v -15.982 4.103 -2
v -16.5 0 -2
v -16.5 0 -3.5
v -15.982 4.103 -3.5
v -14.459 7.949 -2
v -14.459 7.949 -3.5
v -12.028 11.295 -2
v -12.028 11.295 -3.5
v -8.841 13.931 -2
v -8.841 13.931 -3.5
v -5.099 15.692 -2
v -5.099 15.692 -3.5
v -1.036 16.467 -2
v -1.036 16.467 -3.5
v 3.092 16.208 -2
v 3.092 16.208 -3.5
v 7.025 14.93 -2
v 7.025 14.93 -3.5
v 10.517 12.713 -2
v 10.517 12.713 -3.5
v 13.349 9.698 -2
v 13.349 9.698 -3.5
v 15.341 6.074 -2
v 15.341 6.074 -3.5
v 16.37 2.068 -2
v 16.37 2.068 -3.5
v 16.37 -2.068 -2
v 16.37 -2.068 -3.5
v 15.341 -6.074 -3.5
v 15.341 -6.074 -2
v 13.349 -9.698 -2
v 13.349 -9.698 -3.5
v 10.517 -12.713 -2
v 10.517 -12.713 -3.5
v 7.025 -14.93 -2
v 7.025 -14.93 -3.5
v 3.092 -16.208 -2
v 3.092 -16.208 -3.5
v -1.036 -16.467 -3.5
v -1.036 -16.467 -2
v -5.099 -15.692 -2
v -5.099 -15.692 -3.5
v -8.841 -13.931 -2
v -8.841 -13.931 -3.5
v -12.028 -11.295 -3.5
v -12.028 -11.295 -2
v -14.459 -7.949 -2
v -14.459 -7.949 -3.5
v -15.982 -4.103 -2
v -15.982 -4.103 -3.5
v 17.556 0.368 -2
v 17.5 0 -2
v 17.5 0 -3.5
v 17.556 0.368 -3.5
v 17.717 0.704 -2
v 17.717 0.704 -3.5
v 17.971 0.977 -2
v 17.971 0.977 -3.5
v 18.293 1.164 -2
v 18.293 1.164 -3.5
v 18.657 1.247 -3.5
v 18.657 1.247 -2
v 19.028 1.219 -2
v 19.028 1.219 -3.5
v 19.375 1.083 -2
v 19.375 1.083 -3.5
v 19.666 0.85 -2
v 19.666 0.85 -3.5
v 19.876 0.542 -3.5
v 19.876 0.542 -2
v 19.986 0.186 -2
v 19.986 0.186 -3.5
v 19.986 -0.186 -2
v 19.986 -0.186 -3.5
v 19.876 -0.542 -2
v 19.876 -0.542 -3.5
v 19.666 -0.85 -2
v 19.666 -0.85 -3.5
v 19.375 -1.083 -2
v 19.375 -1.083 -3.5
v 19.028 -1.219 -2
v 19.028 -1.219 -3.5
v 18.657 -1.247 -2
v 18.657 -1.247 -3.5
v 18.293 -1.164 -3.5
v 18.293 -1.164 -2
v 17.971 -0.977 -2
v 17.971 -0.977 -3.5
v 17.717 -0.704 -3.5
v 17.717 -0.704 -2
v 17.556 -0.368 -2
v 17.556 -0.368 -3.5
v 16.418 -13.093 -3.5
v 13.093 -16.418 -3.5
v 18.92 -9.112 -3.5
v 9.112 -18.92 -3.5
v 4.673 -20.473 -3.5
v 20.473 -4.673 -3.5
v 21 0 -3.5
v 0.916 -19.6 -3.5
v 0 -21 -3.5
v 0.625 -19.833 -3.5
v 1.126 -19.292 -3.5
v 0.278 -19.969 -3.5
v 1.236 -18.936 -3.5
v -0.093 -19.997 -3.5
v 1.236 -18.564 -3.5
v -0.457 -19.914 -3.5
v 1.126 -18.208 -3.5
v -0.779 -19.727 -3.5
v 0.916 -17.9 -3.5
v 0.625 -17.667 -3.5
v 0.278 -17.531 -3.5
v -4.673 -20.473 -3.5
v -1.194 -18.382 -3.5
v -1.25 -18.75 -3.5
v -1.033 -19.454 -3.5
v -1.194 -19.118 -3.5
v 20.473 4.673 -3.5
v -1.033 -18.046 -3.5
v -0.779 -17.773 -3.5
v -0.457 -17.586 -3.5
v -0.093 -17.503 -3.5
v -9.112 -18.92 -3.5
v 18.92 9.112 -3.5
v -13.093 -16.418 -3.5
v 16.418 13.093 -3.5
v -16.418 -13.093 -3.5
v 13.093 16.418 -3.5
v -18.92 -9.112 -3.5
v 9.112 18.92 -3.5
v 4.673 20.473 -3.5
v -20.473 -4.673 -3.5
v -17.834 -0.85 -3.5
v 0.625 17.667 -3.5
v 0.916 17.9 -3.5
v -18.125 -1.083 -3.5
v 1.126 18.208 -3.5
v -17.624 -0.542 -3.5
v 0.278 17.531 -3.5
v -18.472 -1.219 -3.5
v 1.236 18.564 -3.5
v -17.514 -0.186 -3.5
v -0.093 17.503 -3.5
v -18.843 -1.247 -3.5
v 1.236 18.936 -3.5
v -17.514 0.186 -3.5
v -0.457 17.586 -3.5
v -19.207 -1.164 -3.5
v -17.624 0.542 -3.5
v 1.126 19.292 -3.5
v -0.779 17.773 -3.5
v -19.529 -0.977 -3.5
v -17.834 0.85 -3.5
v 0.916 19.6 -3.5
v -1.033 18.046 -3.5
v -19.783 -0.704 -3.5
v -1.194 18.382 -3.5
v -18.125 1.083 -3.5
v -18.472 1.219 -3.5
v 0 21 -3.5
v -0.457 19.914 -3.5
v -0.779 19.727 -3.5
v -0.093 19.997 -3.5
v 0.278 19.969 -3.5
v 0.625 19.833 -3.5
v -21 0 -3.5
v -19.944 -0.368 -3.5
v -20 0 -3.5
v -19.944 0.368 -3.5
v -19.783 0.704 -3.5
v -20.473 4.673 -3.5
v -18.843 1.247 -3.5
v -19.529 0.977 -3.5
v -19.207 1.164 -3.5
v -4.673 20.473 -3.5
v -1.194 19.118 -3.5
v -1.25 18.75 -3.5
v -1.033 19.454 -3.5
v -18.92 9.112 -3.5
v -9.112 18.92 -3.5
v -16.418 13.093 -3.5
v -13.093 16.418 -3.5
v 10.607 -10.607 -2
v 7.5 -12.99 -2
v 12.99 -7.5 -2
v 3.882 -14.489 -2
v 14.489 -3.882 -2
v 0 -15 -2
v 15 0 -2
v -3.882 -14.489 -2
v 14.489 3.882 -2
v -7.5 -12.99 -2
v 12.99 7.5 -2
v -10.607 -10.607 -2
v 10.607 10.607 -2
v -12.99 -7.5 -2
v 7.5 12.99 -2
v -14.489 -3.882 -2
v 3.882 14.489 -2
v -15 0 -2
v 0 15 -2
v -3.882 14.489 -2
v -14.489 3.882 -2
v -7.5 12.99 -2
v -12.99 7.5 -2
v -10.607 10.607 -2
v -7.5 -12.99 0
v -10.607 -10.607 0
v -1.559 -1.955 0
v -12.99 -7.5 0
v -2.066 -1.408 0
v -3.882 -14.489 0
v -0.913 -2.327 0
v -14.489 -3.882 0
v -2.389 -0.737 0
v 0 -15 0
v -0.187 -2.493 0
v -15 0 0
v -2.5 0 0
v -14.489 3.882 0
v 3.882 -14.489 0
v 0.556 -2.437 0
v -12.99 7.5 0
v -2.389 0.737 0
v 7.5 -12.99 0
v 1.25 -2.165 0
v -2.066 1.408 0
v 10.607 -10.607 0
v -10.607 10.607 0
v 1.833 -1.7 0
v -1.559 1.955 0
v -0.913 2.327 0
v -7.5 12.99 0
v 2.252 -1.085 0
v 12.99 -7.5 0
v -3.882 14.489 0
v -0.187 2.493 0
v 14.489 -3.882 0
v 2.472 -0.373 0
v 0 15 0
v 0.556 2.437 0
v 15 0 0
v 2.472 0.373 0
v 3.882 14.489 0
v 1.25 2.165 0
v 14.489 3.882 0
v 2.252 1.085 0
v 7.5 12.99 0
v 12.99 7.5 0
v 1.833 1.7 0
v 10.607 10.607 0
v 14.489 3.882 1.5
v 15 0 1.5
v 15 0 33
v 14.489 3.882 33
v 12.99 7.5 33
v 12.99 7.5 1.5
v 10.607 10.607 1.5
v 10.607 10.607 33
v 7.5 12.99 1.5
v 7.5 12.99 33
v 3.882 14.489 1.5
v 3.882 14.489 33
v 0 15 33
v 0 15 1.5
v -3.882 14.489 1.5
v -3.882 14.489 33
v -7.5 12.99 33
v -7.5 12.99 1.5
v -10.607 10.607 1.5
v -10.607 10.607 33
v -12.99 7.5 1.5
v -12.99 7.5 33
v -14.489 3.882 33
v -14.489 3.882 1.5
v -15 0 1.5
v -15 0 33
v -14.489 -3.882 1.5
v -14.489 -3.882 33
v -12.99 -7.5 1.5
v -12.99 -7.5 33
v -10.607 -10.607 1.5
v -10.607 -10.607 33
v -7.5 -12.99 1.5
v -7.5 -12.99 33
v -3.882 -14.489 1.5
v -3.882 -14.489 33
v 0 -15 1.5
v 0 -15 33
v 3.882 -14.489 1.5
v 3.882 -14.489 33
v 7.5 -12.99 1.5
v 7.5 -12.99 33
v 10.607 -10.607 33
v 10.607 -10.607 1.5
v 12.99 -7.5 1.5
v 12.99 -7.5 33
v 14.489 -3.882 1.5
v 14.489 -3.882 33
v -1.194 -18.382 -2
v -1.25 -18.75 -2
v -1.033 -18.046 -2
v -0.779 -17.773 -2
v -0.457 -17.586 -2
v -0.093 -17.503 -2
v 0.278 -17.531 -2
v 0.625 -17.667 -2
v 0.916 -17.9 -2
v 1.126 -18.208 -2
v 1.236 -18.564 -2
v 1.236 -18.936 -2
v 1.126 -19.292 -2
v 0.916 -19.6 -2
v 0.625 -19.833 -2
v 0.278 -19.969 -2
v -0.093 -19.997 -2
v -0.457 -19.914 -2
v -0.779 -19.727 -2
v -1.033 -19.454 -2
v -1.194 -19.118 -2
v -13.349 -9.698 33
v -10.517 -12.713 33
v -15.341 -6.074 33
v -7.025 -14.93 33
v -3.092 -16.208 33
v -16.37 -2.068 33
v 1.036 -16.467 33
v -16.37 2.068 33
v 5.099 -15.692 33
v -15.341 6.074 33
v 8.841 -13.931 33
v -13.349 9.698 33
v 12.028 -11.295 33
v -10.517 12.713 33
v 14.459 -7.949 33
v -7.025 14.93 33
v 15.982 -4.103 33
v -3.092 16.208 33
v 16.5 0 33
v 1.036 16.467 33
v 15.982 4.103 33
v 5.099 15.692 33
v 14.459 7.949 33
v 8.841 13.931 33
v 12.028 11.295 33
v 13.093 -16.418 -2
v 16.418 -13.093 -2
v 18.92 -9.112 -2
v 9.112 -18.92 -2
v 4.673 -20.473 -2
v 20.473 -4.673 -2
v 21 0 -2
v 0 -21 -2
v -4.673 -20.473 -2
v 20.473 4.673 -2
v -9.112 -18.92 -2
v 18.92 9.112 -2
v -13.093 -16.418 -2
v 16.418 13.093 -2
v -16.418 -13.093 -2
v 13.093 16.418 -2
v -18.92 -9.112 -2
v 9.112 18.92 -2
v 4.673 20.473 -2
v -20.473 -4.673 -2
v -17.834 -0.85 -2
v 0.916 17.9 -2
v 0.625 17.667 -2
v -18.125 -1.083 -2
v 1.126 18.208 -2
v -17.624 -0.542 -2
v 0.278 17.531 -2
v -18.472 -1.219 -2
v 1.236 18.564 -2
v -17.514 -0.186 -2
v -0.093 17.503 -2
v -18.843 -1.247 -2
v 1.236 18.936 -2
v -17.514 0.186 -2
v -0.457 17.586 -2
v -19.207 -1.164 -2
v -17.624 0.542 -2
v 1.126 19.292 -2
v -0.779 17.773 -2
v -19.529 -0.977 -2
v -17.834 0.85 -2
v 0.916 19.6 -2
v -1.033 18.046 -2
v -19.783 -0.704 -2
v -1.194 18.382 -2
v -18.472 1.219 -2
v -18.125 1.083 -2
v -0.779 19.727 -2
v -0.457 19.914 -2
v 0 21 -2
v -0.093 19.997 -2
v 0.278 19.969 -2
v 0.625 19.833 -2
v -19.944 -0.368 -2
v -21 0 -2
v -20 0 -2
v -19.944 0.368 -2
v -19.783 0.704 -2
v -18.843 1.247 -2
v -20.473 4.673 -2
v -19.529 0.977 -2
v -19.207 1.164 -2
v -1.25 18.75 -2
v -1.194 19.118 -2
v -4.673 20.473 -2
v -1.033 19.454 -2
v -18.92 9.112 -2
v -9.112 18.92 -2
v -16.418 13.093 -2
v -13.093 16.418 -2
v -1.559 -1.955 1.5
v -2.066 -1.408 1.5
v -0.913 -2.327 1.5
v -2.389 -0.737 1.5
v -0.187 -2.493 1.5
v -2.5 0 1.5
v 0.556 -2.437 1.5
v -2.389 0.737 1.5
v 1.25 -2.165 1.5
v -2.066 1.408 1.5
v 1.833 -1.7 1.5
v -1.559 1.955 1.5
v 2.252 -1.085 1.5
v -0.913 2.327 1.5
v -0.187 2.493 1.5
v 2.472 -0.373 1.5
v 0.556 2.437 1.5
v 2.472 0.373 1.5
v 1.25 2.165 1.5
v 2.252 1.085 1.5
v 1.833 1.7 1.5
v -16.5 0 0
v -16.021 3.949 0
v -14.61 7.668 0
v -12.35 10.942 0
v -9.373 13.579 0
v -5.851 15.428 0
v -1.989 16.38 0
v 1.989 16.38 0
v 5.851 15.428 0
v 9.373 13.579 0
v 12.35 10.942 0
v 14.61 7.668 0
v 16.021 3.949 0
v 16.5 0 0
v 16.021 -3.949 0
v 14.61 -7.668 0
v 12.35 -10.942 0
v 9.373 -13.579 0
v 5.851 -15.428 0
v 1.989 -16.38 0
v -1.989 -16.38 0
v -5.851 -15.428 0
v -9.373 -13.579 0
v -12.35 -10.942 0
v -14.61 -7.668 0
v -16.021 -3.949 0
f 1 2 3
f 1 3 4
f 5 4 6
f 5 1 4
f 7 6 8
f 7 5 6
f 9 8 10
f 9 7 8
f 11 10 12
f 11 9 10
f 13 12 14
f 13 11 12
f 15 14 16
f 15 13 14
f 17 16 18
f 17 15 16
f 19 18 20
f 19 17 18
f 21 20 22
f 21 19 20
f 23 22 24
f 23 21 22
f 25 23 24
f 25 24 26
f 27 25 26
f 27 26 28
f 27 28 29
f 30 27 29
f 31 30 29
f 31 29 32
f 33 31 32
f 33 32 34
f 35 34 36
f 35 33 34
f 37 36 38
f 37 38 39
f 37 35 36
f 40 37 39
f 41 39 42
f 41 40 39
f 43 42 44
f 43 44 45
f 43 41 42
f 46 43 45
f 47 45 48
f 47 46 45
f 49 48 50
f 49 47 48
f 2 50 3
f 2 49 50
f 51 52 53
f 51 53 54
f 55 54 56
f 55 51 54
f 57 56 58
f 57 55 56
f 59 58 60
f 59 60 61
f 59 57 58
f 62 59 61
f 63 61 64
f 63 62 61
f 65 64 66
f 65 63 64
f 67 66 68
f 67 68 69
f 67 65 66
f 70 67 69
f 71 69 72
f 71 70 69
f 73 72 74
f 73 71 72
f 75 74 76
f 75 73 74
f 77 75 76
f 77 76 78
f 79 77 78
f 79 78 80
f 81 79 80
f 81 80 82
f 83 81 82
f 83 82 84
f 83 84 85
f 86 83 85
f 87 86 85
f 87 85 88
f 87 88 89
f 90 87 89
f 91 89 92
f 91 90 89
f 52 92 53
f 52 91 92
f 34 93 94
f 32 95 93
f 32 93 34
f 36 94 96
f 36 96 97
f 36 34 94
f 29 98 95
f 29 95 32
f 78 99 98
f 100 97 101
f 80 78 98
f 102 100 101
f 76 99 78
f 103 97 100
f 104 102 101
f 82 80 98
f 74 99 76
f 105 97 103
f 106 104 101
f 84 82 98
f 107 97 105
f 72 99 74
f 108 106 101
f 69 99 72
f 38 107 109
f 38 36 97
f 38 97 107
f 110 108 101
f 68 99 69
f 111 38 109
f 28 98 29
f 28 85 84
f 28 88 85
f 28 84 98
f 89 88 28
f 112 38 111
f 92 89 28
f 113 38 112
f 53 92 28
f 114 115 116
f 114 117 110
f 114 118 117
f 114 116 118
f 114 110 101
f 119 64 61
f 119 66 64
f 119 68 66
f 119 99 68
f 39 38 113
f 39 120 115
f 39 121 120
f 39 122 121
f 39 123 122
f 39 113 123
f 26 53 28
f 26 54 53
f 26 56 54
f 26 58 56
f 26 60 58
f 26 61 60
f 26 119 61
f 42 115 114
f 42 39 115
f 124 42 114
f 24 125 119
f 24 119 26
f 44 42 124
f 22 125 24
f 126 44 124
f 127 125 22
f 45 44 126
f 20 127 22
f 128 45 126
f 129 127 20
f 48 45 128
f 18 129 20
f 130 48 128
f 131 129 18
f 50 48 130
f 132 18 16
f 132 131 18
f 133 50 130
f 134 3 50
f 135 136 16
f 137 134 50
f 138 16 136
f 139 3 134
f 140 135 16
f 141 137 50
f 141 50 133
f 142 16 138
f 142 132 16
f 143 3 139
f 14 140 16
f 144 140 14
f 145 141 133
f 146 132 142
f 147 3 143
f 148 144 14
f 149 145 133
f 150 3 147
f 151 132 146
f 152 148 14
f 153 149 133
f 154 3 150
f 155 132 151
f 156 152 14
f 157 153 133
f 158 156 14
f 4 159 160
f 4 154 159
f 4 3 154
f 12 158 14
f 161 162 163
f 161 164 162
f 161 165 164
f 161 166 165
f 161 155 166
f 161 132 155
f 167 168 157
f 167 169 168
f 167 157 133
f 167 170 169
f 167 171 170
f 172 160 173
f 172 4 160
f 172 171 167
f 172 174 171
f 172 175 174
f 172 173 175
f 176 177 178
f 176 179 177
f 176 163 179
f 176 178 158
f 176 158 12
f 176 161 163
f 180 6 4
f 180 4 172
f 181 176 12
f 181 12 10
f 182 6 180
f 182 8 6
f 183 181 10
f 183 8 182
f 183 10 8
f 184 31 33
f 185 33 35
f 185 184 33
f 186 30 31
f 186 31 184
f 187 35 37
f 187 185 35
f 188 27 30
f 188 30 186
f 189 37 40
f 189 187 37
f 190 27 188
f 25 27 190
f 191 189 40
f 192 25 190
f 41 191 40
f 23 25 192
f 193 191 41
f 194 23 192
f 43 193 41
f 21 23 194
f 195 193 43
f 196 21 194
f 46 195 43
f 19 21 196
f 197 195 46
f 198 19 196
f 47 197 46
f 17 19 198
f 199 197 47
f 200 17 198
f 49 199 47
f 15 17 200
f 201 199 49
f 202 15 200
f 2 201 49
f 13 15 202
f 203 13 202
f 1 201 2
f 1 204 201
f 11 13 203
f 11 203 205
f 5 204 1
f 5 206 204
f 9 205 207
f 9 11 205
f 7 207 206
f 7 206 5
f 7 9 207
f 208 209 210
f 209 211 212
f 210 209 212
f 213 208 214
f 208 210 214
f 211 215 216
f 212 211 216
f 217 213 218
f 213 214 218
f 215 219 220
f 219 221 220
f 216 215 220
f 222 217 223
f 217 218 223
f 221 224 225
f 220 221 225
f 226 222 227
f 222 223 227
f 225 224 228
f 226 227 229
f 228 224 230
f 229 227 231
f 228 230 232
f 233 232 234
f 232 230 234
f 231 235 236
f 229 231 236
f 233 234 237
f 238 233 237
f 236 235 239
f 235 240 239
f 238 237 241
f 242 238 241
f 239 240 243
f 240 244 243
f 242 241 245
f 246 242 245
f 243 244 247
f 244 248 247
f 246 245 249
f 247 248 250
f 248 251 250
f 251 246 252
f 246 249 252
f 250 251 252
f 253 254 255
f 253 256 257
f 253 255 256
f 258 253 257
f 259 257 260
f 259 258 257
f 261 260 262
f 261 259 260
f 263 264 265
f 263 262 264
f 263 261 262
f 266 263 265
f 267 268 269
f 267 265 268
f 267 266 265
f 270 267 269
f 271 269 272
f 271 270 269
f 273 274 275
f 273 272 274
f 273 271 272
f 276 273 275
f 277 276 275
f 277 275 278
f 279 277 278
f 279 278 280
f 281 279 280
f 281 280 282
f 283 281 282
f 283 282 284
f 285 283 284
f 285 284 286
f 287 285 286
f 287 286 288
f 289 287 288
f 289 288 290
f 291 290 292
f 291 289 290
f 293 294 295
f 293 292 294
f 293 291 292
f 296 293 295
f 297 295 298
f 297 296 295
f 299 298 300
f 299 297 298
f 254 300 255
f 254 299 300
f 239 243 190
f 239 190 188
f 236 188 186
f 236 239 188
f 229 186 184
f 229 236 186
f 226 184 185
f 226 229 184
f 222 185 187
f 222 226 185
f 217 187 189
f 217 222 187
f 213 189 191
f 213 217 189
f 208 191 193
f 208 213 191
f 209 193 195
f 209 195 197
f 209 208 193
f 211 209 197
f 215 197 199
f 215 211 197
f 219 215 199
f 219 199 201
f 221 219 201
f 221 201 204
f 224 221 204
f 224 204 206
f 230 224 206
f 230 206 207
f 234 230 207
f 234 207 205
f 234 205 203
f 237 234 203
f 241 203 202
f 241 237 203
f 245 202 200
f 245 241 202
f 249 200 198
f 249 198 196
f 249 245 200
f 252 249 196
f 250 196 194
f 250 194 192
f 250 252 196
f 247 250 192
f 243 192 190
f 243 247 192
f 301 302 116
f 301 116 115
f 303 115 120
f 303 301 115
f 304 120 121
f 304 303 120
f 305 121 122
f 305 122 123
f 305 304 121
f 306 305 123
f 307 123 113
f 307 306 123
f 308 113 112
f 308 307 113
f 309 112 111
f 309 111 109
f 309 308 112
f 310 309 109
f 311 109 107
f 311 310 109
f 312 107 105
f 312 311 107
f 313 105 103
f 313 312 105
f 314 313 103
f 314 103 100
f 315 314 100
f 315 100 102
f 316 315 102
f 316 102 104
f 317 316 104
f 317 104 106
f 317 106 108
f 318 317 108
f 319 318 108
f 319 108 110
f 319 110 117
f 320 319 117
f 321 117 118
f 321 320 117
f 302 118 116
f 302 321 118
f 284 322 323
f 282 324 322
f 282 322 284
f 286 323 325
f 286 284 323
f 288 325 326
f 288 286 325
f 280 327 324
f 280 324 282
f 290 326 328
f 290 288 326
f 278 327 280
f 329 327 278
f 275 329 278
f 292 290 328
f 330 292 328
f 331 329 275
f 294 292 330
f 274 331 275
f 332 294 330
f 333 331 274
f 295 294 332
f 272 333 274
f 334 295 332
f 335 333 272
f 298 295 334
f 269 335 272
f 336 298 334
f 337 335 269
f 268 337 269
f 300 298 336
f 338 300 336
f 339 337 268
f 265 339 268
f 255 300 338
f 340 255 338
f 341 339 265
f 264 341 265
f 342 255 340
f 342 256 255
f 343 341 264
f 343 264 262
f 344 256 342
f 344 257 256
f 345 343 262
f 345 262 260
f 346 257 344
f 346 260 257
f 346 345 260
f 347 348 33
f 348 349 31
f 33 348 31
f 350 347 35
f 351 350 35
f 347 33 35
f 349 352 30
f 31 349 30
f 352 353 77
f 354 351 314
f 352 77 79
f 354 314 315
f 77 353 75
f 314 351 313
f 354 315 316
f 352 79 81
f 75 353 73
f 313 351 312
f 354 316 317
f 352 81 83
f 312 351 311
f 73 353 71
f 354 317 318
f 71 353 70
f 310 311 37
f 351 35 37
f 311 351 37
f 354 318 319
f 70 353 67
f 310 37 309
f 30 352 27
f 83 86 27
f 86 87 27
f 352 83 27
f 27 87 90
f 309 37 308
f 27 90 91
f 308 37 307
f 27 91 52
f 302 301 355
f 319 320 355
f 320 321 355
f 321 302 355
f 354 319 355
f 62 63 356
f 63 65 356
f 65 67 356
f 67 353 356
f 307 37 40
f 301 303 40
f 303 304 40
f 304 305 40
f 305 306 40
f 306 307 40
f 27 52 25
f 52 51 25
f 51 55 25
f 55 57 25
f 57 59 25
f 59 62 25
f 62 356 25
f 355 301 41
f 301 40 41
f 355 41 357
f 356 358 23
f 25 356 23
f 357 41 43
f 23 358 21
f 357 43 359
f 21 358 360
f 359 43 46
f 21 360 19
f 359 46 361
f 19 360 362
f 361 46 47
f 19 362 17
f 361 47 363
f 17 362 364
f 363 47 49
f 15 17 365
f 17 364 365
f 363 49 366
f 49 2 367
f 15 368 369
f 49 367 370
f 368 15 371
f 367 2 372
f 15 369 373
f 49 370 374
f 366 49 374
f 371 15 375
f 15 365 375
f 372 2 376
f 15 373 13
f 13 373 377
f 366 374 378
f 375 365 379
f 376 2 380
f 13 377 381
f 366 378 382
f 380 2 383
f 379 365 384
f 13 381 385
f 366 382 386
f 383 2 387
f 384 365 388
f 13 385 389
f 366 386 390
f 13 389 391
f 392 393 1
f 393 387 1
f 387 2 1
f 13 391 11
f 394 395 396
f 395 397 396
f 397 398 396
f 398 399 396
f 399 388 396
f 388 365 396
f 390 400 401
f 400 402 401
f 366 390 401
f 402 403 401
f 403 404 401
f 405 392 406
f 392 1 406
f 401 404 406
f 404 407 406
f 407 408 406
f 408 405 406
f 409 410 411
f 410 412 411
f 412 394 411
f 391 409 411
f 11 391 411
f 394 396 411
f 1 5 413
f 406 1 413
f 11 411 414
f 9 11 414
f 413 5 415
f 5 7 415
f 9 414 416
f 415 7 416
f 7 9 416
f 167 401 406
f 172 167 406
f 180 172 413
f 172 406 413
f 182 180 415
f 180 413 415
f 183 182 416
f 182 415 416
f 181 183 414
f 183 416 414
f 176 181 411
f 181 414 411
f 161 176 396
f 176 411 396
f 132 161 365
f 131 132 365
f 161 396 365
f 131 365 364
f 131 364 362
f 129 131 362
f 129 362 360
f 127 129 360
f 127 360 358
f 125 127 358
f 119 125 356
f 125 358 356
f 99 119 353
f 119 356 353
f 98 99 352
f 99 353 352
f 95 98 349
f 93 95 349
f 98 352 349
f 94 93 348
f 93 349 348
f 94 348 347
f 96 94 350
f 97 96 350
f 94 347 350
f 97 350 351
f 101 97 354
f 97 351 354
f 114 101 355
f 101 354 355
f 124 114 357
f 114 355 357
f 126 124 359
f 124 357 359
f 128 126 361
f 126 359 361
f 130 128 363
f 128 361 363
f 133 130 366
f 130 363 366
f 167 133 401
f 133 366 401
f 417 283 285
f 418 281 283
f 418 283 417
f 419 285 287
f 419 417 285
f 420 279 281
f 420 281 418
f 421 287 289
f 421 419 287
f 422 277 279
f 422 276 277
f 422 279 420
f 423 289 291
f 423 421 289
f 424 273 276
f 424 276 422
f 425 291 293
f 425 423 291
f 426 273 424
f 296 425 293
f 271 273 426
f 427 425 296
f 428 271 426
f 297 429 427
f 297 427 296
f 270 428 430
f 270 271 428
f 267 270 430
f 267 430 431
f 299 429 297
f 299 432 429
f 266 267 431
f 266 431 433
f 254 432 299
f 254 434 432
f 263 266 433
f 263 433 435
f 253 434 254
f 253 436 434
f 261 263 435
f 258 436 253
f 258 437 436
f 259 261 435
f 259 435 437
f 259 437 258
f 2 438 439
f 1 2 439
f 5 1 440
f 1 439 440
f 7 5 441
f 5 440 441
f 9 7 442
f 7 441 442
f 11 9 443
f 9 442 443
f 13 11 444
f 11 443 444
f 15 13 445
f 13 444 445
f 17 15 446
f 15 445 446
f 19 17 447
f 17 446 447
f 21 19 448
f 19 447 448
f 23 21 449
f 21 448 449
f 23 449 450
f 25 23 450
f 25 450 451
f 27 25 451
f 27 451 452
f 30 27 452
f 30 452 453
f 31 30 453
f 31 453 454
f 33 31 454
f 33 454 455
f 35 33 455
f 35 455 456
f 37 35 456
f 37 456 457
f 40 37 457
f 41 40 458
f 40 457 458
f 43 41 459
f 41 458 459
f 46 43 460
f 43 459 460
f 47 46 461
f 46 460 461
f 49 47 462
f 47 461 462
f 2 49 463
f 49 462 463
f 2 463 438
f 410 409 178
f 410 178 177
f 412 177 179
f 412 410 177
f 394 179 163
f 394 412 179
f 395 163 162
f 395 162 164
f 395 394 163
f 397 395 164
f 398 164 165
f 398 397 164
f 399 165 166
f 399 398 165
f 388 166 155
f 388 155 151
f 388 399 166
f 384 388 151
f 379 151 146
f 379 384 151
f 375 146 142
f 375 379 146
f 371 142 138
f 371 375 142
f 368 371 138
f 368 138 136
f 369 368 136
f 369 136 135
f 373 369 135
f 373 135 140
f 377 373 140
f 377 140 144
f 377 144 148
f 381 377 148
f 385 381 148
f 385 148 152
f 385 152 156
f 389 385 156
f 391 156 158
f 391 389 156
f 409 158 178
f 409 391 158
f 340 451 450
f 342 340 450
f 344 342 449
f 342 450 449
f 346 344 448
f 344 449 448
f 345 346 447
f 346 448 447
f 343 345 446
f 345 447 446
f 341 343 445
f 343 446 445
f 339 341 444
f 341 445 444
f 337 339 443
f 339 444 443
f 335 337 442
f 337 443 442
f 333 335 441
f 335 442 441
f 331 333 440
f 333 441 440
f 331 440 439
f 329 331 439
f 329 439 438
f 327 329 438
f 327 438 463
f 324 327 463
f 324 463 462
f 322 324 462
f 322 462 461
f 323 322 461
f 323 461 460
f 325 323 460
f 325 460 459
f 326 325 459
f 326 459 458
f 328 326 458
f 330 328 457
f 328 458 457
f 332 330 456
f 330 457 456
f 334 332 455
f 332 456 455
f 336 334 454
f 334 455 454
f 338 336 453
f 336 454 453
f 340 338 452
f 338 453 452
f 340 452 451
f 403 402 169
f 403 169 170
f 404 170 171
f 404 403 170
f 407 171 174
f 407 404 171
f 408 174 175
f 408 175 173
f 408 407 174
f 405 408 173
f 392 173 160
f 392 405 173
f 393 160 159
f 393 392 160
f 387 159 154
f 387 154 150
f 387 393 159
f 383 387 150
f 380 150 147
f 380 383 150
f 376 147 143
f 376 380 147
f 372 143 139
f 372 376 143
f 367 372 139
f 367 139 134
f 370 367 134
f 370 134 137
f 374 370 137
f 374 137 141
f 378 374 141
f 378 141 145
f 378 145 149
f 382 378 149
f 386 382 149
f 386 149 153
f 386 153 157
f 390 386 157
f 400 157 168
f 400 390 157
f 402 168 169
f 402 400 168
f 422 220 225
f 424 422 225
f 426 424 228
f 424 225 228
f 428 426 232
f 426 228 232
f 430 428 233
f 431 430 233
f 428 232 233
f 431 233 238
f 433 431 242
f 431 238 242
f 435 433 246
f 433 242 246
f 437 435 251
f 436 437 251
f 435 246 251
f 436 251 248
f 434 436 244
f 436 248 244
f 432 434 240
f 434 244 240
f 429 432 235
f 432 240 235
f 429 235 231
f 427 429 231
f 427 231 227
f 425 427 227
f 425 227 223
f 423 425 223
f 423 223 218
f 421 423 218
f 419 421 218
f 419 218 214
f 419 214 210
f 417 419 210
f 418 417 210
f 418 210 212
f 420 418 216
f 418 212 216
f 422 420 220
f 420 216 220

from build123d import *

# Parameters (mm, degrees)
SKETCH2_R           = 16.5
BOSS_EXTRUDE1_DEPTH = 33
SHELL2_T            = -1.5
SKETCH6_R           = 2.5
CUT_EXTRUDE3_DEPTH  = 1.5
SKETCH7_R           = 16.5
SKETCH7_R_2         = 15
BOSS_EXTRUDE3_DEPTH = 2
SKETCH8_R           = 21
SKETCH8_R_2         = 16.5
SKETCH8_R_3         = 1.25
BOSS_EXTRUDE4_DEPTH = 1.5


with BuildPart() as part:
    # Sketch2 → Boss-Extrude1 (new body)
    with BuildSketch(Plane.XY):
        Circle(SKETCH2_R)
    extrude(amount=BOSS_EXTRUDE1_DEPTH)

    # Shell2
    shell2_openings = [part.faces().sort_by_distance(p)[0] for p in [
        (0, 0, 33),
    ]]
    offset(amount=SHELL2_T, openings=shell2_openings, kind=Kind.INTERSECTION)

    # Sketch6 → Cut-Extrude3 (cut)
    with BuildSketch(Plane(origin=(0, 0, 0), x_dir=(-1, 0, 0), z_dir=(0, 0, -1))):
        Circle(SKETCH6_R)
    extrude(amount=-CUT_EXTRUDE3_DEPTH, mode=Mode.SUBTRACT)

    # Sketch7 → Boss-Extrude3 (add)
    with BuildSketch(Plane(origin=(0, 0, 0), x_dir=(-1, 0, 0), z_dir=(0, 0, -1))):
        Circle(SKETCH7_R)
        with Locations(Location((0, 0, 0), (0, 0, 180))):
            Circle(SKETCH7_R_2, mode=Mode.SUBTRACT)
    extrude(amount=BOSS_EXTRUDE3_DEPTH)


with BuildPart() as body_2:
    # Sketch8 → Boss-Extrude4 (new body)
    with BuildSketch(Plane(origin=(0, 0, -2), x_dir=(-1, 0, 0), z_dir=(0, 0, -1))):
        Circle(SKETCH8_R)
        Circle(SKETCH8_R_2, mode=Mode.SUBTRACT)
        with Locations((0, 18.75)):
            Circle(SKETCH8_R_3, mode=Mode.SUBTRACT)
        with Locations((18.75, 0)):
            Circle(SKETCH8_R_3, mode=Mode.SUBTRACT)
        with Locations((0, -18.75)):
            Circle(SKETCH8_R_3, mode=Mode.SUBTRACT)
        with Locations((-18.75, 0)):
            Circle(SKETCH8_R_3, mode=Mode.SUBTRACT)
    extrude(amount=BOSS_EXTRUDE4_DEPTH)


solid = Compound([part.part, body_2.part])
